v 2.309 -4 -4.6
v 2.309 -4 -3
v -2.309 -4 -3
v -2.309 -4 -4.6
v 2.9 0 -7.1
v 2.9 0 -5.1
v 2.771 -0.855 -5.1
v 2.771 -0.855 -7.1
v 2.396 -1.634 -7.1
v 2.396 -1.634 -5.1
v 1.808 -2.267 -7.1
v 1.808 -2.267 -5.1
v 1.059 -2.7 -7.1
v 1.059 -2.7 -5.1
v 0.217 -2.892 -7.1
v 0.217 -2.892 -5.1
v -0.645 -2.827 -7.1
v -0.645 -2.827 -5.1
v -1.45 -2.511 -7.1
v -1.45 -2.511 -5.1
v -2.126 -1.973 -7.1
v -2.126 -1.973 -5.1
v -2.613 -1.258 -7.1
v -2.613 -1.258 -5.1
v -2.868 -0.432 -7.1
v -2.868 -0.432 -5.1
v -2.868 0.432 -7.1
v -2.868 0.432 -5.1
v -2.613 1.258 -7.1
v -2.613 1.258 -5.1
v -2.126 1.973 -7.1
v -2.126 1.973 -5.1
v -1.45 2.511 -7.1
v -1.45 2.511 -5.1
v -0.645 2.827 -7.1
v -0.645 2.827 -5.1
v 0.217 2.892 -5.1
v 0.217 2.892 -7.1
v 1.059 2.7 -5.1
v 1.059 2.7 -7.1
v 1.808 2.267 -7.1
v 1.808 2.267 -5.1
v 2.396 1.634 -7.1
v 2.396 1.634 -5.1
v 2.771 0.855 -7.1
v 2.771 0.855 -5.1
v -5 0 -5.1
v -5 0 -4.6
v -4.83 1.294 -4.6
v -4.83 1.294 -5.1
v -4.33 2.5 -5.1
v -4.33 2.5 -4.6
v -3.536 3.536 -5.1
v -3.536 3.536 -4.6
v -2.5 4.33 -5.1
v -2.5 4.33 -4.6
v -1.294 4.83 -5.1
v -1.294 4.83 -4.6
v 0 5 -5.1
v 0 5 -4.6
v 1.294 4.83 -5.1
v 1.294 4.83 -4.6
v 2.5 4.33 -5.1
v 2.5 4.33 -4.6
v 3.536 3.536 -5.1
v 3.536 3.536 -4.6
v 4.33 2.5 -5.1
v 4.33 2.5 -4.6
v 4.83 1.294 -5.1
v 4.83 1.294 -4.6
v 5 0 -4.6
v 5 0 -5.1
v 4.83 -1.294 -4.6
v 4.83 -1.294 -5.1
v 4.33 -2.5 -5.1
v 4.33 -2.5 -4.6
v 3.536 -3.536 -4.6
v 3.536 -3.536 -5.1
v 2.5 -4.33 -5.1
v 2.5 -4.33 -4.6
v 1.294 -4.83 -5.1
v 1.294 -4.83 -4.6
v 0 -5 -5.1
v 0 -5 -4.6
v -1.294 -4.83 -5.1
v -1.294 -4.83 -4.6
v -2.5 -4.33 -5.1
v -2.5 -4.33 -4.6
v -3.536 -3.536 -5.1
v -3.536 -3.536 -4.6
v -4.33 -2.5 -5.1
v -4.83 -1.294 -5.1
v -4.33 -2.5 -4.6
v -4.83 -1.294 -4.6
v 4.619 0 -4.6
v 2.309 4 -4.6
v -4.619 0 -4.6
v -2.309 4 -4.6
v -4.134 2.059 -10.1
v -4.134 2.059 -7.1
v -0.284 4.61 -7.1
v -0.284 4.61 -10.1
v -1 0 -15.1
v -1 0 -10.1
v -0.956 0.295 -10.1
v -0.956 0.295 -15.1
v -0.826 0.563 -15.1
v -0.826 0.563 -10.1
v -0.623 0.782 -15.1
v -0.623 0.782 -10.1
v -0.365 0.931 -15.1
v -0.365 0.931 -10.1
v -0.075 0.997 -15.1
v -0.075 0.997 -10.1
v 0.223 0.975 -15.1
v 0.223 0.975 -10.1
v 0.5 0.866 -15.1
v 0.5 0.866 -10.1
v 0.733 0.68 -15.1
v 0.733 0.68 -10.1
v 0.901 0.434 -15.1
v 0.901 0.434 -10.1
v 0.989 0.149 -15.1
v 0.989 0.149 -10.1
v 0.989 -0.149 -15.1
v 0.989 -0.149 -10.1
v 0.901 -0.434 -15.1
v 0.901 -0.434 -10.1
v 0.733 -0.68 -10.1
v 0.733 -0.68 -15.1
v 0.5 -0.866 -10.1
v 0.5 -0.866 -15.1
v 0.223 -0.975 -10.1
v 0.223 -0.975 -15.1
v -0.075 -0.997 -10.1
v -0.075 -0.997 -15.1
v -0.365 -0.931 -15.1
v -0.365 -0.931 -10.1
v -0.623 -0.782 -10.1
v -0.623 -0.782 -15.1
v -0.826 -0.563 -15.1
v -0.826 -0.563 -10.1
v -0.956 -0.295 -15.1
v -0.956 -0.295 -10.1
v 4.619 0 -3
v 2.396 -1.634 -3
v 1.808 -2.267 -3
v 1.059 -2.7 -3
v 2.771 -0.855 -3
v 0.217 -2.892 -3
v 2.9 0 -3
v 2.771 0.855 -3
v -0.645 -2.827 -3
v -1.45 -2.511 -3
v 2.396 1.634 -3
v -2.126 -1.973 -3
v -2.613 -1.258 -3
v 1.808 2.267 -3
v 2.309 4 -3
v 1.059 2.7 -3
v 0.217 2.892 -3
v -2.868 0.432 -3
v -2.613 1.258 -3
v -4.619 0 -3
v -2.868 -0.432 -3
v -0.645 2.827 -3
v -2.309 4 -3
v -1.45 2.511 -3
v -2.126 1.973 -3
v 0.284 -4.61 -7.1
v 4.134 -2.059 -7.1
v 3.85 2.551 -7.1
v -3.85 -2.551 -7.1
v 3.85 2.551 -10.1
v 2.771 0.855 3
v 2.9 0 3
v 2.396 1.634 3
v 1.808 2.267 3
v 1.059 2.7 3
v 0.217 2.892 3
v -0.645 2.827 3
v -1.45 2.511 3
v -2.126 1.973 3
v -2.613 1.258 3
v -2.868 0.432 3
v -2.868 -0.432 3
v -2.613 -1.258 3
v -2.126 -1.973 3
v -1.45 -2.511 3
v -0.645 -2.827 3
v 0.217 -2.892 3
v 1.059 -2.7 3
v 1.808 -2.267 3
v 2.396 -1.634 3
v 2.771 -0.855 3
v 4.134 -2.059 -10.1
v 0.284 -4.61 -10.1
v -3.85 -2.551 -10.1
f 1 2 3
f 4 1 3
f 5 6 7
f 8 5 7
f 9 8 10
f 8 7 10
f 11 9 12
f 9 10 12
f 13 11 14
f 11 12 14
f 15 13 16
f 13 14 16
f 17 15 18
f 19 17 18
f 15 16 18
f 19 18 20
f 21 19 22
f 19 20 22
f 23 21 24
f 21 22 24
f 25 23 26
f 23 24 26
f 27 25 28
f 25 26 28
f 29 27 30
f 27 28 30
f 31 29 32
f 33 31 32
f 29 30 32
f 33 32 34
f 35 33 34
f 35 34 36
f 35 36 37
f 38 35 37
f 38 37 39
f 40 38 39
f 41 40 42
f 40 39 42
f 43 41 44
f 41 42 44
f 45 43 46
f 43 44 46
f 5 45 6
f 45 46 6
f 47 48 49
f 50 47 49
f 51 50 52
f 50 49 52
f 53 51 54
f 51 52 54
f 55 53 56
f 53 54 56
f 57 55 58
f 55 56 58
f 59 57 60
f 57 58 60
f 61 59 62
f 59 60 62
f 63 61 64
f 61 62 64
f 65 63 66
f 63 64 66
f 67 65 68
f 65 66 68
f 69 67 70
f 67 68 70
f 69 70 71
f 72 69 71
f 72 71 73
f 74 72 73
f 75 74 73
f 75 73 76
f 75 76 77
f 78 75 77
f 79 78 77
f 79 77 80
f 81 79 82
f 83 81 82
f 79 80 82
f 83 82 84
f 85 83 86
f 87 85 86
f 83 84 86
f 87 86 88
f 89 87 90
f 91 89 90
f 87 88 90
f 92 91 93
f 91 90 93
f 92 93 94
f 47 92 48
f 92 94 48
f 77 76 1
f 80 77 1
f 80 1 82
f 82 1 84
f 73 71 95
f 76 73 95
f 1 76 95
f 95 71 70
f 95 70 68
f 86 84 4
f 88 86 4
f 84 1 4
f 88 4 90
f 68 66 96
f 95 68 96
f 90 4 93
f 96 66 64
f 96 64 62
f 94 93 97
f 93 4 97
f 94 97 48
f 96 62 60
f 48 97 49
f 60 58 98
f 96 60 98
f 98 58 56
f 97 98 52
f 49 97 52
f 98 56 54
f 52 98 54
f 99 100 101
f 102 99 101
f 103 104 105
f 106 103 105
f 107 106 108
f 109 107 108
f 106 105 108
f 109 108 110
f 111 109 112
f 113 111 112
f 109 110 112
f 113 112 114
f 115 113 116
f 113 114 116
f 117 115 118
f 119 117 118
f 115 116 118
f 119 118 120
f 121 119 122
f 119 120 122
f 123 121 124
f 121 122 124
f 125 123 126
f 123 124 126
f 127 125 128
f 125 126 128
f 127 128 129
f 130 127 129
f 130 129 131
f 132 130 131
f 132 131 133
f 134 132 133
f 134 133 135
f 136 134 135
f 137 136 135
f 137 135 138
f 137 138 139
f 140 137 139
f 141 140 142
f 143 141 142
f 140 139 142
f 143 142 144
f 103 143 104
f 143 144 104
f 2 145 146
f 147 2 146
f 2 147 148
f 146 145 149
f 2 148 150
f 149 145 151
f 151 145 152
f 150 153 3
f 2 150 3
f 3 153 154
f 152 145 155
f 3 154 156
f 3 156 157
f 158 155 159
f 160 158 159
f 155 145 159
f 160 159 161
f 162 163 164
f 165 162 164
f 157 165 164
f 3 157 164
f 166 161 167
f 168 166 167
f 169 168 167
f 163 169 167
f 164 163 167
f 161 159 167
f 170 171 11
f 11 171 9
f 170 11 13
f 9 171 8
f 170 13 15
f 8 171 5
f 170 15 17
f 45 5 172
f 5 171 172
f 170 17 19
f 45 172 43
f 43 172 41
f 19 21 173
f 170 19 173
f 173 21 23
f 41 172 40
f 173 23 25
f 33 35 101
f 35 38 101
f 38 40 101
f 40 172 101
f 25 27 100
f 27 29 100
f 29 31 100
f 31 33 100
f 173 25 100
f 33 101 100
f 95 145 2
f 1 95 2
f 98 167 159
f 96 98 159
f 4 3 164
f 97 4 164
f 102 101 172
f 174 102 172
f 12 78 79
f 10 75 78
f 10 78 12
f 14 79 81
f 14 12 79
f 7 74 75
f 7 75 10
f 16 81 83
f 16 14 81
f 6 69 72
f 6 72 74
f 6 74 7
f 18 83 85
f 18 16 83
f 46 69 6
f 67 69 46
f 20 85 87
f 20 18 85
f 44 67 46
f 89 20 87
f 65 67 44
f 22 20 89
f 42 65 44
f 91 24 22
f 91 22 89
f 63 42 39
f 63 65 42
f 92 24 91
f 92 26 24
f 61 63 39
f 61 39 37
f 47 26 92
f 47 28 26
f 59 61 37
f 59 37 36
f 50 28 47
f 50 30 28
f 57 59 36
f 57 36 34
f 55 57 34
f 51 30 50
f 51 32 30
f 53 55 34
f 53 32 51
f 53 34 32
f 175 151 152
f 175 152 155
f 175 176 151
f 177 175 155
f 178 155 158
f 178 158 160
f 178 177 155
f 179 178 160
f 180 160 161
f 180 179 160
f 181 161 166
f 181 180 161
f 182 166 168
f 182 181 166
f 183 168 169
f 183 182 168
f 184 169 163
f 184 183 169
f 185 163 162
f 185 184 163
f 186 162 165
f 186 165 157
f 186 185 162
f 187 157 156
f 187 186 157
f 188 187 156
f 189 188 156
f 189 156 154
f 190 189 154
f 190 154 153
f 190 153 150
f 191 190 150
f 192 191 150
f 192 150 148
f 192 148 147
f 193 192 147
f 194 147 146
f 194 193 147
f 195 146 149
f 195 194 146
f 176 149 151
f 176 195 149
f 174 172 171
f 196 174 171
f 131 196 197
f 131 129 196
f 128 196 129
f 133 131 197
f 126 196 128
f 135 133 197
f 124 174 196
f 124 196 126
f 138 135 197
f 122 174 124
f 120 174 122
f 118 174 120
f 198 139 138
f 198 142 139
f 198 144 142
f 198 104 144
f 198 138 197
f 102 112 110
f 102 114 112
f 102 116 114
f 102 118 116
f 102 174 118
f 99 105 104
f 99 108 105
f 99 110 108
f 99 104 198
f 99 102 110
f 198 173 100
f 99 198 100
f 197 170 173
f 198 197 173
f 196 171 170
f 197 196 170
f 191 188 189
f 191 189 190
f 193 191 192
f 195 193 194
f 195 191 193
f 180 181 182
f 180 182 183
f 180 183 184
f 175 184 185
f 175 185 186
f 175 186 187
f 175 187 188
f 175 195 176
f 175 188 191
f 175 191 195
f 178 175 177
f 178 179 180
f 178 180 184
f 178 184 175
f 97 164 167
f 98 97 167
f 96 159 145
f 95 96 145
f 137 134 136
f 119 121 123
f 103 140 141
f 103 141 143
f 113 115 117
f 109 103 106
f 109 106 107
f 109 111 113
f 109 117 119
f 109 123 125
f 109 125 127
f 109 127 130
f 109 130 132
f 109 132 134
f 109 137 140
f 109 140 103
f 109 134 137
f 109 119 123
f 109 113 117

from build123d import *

# Parameters (mm, degrees)
SKETCH1_R           = 2.9
BOSS_EXTRUDE1_DEPTH = 3
BOSS_EXTRUDE2_DEPTH = 1.6
SKETCH3_R           = 5
BOSS_EXTRUDE3_DEPTH = 0.5
SKETCH4_R           = 2.9
BOSS_EXTRUDE4_DEPTH = 2
BOSS_EXTRUDE5_DEPTH = 3
SKETCH6_R           = 1
BOSS_EXTRUDE6_DEPTH = 5


with BuildPart() as part:
    # Sketch1 → Boss-Extrude1 (new, symmetric)
    with BuildSketch(Plane.XY):
        Circle(SKETCH1_R)
    extrude(amount=BOSS_EXTRUDE1_DEPTH, both=True)

    # Sketch2 → Boss-Extrude2 (add)
    with BuildSketch(Plane(origin=(0, 0, -3), x_dir=(-1, 0, 0), z_dir=(0, 0, -1))):
        Polygon((4.618802154, 0), (2.309401077, 4), (-2.309401077, 4), (-4.618802154, 0), (-2.309401077, -4), (2.309401077, -4), align=None)
    extrude(amount=BOSS_EXTRUDE2_DEPTH)

    # Sketch3 → Boss-Extrude3 (add)
    with BuildSketch(Plane(origin=(0, 0, -4.6), x_dir=(-1, 0, 0), z_dir=(0, 0, -1))):
        Circle(SKETCH3_R)
    extrude(amount=BOSS_EXTRUDE3_DEPTH)

    # Sketch4 → Boss-Extrude4 (add)
    with BuildSketch(Plane(origin=(0, 0, -5.1), x_dir=(-1, 0, 0), z_dir=(0, 0, -1))):
        with Locations(Location((0, 0, 0), (0, 0, 180))):
            Circle(SKETCH4_R)
    extrude(amount=BOSS_EXTRUDE4_DEPTH)

    # Sketch5 → Boss-Extrude5 (add)
    with BuildSketch(Plane(origin=(0, 0, -7.1), x_dir=(-1, 0, 0), z_dir=(0, 0, -1))):
        Polygon((4.134382211, 2.059178737), (0.283890008, 4.610069392), (-3.850492202, 2.550890655), (-4.134382211, -2.059178737), (-0.283890008, -4.610069392), (3.850492202, -2.550890655), align=None)
    extrude(amount=BOSS_EXTRUDE5_DEPTH)

    # Sketch6 → Boss-Extrude6 (add)
    with BuildSketch(Plane(origin=(0, 0, -10.1), x_dir=(-1, 0, 0), z_dir=(0, 0, -1))):
        Circle(SKETCH6_R)
    extrude(amount=BOSS_EXTRUDE6_DEPTH)


solid = part.part
